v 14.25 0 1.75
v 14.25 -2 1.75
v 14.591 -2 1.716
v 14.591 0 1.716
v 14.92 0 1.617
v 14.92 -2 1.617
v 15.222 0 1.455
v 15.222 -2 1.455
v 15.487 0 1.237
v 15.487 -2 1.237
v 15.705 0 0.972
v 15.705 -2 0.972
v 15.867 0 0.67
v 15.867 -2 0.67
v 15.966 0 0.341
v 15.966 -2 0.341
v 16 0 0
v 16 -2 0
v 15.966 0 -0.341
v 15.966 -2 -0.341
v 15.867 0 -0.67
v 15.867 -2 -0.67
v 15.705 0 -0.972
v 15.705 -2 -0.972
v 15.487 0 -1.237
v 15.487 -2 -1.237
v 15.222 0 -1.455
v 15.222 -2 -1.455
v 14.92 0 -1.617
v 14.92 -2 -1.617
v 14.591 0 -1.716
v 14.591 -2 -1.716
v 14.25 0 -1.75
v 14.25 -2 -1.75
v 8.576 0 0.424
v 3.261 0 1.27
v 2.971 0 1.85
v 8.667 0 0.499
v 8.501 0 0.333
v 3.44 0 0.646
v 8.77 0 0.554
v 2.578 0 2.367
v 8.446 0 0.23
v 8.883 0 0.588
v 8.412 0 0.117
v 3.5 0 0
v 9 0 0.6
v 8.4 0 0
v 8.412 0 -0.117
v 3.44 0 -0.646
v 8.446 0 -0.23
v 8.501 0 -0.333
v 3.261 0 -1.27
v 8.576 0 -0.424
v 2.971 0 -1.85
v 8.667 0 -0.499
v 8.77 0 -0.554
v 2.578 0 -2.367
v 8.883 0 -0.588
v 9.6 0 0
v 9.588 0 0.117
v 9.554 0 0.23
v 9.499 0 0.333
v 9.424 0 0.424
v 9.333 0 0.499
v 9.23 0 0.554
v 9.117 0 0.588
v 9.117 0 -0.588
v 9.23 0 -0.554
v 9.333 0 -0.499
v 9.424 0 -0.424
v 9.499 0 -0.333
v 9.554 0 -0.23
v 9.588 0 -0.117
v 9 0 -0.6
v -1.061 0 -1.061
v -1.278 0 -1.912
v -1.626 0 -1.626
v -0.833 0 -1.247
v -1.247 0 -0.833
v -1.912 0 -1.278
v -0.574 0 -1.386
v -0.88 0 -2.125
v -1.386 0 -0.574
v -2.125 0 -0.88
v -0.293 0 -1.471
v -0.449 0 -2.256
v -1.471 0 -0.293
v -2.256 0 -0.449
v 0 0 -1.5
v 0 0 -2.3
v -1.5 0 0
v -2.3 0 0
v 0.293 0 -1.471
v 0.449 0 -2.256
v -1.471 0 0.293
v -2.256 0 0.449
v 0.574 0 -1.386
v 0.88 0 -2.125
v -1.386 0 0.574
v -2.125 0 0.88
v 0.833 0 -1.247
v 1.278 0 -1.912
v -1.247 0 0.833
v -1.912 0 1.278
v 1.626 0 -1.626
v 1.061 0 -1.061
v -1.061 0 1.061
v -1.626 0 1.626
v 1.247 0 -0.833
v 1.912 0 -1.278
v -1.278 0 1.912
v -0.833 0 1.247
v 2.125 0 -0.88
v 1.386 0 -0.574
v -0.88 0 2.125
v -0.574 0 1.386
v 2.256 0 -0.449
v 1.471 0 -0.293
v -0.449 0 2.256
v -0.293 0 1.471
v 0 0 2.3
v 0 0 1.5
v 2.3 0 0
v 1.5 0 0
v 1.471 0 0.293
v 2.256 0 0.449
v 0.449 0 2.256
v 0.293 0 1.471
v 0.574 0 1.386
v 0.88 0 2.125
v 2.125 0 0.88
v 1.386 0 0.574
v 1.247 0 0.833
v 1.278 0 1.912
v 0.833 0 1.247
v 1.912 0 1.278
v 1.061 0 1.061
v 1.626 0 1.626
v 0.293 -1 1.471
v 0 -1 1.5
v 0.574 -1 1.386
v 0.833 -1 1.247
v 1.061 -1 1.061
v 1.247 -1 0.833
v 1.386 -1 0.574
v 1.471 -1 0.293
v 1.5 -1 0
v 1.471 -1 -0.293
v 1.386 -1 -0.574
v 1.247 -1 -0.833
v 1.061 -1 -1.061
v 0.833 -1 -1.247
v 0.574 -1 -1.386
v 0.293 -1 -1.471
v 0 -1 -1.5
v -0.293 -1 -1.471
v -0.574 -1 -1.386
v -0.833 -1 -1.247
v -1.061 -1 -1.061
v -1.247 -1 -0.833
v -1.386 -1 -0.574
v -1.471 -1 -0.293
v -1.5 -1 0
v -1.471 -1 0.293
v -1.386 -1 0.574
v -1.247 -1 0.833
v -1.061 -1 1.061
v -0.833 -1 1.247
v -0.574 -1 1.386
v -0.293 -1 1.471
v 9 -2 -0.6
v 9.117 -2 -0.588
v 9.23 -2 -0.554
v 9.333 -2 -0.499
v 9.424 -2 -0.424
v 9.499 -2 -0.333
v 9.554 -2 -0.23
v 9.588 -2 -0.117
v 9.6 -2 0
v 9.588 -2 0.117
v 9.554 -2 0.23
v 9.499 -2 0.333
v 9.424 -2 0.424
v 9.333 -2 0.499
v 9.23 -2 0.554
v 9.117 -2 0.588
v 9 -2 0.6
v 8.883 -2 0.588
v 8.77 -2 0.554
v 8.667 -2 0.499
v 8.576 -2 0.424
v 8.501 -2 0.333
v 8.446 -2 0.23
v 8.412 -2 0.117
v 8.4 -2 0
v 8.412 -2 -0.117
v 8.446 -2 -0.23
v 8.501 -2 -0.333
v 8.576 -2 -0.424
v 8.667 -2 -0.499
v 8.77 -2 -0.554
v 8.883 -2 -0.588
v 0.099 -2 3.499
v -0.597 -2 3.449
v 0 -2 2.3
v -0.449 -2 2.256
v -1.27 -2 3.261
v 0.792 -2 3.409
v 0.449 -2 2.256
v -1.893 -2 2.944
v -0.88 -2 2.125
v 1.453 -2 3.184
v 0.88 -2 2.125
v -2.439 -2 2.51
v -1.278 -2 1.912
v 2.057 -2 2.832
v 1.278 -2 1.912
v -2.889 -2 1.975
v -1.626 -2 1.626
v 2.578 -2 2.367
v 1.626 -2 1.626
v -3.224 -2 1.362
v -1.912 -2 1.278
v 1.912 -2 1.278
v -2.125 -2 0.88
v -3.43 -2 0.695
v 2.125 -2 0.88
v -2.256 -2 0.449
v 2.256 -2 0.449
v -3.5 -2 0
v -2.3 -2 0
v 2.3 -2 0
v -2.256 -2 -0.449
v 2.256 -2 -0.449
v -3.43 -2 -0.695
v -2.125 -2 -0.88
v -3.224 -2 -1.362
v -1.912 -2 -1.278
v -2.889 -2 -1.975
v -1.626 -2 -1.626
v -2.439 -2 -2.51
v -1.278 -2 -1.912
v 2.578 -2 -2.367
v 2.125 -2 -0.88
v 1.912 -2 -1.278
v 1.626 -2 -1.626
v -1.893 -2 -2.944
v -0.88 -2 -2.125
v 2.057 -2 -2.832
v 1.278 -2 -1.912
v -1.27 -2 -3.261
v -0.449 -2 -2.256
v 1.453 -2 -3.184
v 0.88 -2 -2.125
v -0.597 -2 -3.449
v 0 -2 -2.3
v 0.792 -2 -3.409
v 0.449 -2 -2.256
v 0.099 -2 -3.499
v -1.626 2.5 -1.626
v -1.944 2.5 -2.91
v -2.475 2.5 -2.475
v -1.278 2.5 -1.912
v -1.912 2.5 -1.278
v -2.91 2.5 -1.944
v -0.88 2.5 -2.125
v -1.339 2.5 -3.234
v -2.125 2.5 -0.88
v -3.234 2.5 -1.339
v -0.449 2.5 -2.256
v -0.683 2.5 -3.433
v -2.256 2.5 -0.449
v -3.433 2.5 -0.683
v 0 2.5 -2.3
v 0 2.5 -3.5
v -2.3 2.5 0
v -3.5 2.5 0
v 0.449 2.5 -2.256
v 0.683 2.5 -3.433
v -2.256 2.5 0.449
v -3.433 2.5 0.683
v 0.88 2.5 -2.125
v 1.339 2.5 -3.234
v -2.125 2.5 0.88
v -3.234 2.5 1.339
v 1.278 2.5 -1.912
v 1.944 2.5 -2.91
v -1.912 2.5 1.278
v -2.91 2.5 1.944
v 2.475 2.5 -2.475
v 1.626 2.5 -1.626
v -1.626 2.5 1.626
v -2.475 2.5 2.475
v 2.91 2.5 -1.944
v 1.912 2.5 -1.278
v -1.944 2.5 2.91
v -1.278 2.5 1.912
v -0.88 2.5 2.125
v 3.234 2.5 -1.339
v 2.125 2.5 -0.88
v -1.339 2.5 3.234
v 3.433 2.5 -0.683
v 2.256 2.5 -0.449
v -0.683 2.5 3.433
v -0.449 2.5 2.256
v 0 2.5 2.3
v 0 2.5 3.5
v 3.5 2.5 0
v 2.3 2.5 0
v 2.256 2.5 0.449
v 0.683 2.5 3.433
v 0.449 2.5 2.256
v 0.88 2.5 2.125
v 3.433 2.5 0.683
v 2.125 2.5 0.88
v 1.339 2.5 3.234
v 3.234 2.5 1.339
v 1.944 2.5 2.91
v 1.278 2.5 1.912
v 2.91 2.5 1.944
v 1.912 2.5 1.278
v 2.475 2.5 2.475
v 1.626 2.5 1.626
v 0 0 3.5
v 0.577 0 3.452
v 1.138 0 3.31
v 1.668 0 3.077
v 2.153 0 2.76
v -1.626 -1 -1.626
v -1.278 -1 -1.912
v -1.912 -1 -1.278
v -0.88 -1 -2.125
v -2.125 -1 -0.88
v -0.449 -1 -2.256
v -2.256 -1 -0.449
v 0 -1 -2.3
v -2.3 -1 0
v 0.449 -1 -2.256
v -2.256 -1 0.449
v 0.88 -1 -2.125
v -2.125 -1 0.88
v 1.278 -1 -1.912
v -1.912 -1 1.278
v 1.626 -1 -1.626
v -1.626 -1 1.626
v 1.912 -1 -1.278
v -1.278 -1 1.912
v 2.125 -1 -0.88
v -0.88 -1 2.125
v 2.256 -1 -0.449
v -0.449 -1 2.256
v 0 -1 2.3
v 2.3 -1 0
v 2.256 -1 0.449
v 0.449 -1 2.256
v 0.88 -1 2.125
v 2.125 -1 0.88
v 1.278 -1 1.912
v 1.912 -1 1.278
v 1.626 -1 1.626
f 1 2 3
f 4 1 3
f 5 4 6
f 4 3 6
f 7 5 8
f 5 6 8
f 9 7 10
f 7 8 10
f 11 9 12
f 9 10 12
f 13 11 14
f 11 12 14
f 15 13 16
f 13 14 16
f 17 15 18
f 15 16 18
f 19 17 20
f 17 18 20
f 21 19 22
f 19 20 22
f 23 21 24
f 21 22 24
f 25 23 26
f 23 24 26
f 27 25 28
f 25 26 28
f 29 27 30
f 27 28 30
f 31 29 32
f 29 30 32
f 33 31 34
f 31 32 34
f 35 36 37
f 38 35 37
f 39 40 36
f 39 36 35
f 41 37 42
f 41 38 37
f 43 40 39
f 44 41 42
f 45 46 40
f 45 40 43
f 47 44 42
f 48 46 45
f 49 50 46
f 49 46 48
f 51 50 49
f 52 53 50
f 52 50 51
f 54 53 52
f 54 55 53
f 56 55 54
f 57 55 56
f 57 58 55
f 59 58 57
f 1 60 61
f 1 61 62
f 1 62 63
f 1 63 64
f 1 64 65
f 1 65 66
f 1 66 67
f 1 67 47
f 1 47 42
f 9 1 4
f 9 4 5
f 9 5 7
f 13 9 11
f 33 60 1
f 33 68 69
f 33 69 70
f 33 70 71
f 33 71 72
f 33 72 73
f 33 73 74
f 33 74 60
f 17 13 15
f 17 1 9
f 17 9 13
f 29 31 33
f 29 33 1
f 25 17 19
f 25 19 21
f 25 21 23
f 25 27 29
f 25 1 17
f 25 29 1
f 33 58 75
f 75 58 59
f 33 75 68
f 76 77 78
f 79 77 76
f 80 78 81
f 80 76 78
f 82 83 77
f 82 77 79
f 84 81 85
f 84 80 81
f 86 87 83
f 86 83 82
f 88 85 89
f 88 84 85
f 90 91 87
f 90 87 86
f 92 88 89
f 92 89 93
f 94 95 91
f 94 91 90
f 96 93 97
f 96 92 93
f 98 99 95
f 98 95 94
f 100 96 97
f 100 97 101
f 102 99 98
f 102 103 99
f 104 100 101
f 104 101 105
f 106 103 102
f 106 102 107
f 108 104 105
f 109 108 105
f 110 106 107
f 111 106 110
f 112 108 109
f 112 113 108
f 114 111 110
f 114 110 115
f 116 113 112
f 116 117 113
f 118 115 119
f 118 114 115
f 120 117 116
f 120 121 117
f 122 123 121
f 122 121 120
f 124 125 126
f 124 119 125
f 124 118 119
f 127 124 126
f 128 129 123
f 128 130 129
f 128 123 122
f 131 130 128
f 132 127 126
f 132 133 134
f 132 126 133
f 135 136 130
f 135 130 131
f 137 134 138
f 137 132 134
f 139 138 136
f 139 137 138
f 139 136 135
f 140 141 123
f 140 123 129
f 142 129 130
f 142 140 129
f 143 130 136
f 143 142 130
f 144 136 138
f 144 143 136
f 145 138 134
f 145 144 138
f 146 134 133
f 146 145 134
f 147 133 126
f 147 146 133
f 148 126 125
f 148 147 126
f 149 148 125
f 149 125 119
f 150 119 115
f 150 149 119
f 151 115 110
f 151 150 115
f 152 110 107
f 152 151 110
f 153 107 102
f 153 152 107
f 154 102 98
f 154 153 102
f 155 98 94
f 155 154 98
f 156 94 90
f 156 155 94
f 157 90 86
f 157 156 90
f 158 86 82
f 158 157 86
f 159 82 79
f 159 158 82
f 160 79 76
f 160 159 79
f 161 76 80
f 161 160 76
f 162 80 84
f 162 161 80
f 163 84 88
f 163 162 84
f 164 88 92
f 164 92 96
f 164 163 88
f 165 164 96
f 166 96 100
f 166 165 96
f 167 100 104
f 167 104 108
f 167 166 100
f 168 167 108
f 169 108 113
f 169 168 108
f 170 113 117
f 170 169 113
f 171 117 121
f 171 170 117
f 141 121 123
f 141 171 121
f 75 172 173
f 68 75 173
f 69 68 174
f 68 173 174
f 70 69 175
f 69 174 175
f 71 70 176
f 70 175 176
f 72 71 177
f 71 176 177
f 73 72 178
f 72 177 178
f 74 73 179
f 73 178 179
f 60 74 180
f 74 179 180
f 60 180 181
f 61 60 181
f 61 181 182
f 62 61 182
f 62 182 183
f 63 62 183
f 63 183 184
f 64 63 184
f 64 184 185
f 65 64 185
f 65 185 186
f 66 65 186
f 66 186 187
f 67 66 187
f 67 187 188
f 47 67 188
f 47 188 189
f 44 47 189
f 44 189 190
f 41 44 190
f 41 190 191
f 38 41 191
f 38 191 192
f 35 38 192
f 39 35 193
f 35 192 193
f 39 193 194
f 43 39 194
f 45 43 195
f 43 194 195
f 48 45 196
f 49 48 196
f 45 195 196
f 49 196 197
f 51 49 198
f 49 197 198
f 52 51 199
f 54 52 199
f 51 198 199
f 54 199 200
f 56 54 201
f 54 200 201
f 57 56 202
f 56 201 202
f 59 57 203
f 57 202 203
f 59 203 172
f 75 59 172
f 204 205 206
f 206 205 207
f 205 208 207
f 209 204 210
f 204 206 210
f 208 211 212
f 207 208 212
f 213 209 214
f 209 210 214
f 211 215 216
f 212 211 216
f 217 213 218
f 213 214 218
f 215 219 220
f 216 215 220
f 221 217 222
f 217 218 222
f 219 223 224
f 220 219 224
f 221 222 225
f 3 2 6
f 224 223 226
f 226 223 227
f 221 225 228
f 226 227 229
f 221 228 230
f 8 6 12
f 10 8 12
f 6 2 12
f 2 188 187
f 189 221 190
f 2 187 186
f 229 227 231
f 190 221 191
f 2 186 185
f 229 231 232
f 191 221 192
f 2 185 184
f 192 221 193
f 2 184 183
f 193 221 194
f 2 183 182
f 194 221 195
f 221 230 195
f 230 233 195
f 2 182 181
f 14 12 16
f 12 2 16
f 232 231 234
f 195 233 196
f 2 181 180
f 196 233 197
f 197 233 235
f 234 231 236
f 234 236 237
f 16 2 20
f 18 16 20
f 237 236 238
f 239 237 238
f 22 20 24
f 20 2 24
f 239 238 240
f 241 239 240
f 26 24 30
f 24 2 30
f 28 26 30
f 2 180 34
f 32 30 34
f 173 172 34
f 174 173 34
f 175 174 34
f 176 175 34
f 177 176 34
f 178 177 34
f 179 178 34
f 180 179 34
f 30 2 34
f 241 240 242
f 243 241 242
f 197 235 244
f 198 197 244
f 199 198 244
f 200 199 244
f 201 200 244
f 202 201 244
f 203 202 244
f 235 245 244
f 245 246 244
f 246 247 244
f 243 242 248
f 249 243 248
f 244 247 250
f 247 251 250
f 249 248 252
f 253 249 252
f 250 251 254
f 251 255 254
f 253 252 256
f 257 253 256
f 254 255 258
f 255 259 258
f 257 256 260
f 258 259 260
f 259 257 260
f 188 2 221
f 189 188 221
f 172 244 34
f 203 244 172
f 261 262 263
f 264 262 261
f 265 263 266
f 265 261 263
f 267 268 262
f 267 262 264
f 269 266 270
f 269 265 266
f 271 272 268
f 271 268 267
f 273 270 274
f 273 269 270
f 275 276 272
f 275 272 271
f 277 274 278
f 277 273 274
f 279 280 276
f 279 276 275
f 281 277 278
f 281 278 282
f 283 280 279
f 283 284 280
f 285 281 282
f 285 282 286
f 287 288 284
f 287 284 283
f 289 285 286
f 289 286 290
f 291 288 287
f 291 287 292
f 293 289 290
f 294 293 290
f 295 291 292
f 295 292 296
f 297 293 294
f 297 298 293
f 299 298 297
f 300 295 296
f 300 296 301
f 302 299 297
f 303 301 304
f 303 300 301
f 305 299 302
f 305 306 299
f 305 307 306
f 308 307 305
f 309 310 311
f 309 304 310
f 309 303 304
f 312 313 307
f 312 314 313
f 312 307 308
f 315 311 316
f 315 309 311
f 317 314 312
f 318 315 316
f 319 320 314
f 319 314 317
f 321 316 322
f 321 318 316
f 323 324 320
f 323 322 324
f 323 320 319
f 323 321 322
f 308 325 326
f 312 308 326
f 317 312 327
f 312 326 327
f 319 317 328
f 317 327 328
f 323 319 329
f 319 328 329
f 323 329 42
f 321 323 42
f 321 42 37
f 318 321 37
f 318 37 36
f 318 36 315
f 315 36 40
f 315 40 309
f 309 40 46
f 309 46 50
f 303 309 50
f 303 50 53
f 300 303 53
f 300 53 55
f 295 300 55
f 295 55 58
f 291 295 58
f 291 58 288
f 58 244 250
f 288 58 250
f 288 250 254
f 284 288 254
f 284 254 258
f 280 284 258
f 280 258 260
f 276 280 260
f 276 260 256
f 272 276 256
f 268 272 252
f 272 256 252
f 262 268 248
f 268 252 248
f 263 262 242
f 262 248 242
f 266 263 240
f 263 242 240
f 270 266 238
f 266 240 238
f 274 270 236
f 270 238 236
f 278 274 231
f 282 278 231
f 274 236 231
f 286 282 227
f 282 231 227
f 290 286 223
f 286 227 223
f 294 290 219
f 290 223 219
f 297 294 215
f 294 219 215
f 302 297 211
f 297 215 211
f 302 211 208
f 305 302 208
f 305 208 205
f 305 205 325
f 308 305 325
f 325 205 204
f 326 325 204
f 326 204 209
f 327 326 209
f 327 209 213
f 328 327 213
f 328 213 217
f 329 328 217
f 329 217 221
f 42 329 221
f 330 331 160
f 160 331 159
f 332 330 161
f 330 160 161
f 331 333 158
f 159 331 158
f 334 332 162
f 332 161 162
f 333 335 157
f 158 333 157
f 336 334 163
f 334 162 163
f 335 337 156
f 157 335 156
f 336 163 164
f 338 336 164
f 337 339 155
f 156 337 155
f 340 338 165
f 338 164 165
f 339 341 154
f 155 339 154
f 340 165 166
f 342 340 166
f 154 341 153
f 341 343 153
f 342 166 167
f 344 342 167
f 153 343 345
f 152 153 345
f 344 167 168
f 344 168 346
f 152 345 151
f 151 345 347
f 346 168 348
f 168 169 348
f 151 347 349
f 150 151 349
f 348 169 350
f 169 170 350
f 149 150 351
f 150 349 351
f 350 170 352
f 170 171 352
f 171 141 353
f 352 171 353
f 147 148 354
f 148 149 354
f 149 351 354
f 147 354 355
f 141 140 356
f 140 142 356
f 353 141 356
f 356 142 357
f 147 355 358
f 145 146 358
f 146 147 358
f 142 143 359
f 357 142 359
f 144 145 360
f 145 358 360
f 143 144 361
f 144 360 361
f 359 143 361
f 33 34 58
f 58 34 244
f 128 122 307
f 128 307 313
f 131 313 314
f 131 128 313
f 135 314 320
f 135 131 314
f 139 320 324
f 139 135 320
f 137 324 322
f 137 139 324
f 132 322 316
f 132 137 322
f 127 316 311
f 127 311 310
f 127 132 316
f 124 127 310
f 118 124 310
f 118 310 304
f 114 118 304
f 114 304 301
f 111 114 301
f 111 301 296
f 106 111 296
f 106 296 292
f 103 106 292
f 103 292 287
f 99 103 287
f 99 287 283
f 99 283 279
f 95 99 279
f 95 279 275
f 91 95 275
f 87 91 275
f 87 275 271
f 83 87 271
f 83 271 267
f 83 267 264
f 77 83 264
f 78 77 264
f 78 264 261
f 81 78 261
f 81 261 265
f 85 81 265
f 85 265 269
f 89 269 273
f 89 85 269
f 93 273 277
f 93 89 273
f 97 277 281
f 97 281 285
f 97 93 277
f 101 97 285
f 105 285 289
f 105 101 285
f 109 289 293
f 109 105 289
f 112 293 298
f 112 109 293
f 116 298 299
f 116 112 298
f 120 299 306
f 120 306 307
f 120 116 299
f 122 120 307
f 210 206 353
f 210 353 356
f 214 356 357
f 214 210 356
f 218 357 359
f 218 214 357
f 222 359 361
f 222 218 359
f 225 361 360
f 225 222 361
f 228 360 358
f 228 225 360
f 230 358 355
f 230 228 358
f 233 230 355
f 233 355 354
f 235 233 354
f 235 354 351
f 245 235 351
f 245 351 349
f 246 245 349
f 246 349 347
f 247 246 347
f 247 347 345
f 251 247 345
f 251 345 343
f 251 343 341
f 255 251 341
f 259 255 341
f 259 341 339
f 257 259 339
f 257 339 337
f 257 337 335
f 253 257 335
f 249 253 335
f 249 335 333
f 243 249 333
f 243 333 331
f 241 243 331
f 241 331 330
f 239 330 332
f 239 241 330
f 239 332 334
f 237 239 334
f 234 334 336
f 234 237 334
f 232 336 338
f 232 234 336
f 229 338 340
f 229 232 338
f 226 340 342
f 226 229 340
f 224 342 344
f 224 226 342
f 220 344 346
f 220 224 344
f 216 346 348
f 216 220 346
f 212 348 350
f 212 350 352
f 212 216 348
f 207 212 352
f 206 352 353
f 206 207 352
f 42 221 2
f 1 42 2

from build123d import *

# Parameters (mm, degrees)
SKETCH1_R           = 2.3
BOSS_EXTRUDE1_DEPTH = 2.5
BOSS_EXTRUDE2_START = -2
SKETCH1_3_R         = 2.3
BOSS_EXTRUDE2_DEPTH = 2
BOSS_EXTRUDE3_START = -1
SKETCH2_R           = 2.3
SKETCH2_R_2         = 1.5
BOSS_EXTRUDE3_DEPTH = 1
SKETCH3_R           = 0.6
CUT_EXTRUDE1_DEPTH  = 10


with BuildPart() as part:
    # Sketch1 → Boss-Extrude1 (new body)
    with BuildSketch(Plane(origin=(0, 0, 0), x_dir=(1, 0, 0), z_dir=(0, 1, 0))):
        with BuildLine():
            ThreePointArc((3.5, 0), (3.261386166, 1.270181198), (2.578079842, 2.367172221))
            ThreePointArc((2.578079842, 2.367172221), (-3.5, 0), (2.578079842, -2.367172221))
            ThreePointArc((2.578079842, -2.367172221), (3.261386166, -1.270181198), (3.5, 0))
        make_face()
        Circle(SKETCH1_R, mode=Mode.SUBTRACT)
    extrude(amount=BOSS_EXTRUDE1_DEPTH)

    # Sketch1<3> → Boss-Extrude2 (add)
    with BuildSketch(Plane(origin=(0, 0, 0), x_dir=(1, 0, 0), z_dir=(0, 1, 0)).offset(BOSS_EXTRUDE2_START)):
        with BuildLine():
            ThreePointArc((14.25, -1.75), (16, 0), (14.25, 1.75))
            Line((14.25, 1.75), (2.578079842, 2.367172221))
            ThreePointArc((2.578079842, 2.367172221), (-3.5, 0), (2.578079842, -2.367172221))
            Line((2.578079842, -2.367172221), (14.25, -1.75))
        make_face()
        Circle(SKETCH1_3_R, mode=Mode.SUBTRACT)
    extrude(amount=BOSS_EXTRUDE2_DEPTH)

    # Sketch2 → Boss-Extrude3 (add)
    with BuildSketch(Plane(origin=(0, 0, 0), x_dir=(1, 0, 0), z_dir=(0, 1, 0)).offset(BOSS_EXTRUDE3_START)):
        Circle(SKETCH2_R)
        Circle(SKETCH2_R_2, mode=Mode.SUBTRACT)
    extrude(amount=BOSS_EXTRUDE3_DEPTH)

    # Sketch3 → Cut-Extrude1 (cut)
    with BuildSketch(Plane.XZ.offset(2)):
        with Locations((9, 0)):
            Circle(SKETCH3_R)
    extrude(amount=-CUT_EXTRUDE1_DEPTH, mode=Mode.SUBTRACT)


solid = part.part
